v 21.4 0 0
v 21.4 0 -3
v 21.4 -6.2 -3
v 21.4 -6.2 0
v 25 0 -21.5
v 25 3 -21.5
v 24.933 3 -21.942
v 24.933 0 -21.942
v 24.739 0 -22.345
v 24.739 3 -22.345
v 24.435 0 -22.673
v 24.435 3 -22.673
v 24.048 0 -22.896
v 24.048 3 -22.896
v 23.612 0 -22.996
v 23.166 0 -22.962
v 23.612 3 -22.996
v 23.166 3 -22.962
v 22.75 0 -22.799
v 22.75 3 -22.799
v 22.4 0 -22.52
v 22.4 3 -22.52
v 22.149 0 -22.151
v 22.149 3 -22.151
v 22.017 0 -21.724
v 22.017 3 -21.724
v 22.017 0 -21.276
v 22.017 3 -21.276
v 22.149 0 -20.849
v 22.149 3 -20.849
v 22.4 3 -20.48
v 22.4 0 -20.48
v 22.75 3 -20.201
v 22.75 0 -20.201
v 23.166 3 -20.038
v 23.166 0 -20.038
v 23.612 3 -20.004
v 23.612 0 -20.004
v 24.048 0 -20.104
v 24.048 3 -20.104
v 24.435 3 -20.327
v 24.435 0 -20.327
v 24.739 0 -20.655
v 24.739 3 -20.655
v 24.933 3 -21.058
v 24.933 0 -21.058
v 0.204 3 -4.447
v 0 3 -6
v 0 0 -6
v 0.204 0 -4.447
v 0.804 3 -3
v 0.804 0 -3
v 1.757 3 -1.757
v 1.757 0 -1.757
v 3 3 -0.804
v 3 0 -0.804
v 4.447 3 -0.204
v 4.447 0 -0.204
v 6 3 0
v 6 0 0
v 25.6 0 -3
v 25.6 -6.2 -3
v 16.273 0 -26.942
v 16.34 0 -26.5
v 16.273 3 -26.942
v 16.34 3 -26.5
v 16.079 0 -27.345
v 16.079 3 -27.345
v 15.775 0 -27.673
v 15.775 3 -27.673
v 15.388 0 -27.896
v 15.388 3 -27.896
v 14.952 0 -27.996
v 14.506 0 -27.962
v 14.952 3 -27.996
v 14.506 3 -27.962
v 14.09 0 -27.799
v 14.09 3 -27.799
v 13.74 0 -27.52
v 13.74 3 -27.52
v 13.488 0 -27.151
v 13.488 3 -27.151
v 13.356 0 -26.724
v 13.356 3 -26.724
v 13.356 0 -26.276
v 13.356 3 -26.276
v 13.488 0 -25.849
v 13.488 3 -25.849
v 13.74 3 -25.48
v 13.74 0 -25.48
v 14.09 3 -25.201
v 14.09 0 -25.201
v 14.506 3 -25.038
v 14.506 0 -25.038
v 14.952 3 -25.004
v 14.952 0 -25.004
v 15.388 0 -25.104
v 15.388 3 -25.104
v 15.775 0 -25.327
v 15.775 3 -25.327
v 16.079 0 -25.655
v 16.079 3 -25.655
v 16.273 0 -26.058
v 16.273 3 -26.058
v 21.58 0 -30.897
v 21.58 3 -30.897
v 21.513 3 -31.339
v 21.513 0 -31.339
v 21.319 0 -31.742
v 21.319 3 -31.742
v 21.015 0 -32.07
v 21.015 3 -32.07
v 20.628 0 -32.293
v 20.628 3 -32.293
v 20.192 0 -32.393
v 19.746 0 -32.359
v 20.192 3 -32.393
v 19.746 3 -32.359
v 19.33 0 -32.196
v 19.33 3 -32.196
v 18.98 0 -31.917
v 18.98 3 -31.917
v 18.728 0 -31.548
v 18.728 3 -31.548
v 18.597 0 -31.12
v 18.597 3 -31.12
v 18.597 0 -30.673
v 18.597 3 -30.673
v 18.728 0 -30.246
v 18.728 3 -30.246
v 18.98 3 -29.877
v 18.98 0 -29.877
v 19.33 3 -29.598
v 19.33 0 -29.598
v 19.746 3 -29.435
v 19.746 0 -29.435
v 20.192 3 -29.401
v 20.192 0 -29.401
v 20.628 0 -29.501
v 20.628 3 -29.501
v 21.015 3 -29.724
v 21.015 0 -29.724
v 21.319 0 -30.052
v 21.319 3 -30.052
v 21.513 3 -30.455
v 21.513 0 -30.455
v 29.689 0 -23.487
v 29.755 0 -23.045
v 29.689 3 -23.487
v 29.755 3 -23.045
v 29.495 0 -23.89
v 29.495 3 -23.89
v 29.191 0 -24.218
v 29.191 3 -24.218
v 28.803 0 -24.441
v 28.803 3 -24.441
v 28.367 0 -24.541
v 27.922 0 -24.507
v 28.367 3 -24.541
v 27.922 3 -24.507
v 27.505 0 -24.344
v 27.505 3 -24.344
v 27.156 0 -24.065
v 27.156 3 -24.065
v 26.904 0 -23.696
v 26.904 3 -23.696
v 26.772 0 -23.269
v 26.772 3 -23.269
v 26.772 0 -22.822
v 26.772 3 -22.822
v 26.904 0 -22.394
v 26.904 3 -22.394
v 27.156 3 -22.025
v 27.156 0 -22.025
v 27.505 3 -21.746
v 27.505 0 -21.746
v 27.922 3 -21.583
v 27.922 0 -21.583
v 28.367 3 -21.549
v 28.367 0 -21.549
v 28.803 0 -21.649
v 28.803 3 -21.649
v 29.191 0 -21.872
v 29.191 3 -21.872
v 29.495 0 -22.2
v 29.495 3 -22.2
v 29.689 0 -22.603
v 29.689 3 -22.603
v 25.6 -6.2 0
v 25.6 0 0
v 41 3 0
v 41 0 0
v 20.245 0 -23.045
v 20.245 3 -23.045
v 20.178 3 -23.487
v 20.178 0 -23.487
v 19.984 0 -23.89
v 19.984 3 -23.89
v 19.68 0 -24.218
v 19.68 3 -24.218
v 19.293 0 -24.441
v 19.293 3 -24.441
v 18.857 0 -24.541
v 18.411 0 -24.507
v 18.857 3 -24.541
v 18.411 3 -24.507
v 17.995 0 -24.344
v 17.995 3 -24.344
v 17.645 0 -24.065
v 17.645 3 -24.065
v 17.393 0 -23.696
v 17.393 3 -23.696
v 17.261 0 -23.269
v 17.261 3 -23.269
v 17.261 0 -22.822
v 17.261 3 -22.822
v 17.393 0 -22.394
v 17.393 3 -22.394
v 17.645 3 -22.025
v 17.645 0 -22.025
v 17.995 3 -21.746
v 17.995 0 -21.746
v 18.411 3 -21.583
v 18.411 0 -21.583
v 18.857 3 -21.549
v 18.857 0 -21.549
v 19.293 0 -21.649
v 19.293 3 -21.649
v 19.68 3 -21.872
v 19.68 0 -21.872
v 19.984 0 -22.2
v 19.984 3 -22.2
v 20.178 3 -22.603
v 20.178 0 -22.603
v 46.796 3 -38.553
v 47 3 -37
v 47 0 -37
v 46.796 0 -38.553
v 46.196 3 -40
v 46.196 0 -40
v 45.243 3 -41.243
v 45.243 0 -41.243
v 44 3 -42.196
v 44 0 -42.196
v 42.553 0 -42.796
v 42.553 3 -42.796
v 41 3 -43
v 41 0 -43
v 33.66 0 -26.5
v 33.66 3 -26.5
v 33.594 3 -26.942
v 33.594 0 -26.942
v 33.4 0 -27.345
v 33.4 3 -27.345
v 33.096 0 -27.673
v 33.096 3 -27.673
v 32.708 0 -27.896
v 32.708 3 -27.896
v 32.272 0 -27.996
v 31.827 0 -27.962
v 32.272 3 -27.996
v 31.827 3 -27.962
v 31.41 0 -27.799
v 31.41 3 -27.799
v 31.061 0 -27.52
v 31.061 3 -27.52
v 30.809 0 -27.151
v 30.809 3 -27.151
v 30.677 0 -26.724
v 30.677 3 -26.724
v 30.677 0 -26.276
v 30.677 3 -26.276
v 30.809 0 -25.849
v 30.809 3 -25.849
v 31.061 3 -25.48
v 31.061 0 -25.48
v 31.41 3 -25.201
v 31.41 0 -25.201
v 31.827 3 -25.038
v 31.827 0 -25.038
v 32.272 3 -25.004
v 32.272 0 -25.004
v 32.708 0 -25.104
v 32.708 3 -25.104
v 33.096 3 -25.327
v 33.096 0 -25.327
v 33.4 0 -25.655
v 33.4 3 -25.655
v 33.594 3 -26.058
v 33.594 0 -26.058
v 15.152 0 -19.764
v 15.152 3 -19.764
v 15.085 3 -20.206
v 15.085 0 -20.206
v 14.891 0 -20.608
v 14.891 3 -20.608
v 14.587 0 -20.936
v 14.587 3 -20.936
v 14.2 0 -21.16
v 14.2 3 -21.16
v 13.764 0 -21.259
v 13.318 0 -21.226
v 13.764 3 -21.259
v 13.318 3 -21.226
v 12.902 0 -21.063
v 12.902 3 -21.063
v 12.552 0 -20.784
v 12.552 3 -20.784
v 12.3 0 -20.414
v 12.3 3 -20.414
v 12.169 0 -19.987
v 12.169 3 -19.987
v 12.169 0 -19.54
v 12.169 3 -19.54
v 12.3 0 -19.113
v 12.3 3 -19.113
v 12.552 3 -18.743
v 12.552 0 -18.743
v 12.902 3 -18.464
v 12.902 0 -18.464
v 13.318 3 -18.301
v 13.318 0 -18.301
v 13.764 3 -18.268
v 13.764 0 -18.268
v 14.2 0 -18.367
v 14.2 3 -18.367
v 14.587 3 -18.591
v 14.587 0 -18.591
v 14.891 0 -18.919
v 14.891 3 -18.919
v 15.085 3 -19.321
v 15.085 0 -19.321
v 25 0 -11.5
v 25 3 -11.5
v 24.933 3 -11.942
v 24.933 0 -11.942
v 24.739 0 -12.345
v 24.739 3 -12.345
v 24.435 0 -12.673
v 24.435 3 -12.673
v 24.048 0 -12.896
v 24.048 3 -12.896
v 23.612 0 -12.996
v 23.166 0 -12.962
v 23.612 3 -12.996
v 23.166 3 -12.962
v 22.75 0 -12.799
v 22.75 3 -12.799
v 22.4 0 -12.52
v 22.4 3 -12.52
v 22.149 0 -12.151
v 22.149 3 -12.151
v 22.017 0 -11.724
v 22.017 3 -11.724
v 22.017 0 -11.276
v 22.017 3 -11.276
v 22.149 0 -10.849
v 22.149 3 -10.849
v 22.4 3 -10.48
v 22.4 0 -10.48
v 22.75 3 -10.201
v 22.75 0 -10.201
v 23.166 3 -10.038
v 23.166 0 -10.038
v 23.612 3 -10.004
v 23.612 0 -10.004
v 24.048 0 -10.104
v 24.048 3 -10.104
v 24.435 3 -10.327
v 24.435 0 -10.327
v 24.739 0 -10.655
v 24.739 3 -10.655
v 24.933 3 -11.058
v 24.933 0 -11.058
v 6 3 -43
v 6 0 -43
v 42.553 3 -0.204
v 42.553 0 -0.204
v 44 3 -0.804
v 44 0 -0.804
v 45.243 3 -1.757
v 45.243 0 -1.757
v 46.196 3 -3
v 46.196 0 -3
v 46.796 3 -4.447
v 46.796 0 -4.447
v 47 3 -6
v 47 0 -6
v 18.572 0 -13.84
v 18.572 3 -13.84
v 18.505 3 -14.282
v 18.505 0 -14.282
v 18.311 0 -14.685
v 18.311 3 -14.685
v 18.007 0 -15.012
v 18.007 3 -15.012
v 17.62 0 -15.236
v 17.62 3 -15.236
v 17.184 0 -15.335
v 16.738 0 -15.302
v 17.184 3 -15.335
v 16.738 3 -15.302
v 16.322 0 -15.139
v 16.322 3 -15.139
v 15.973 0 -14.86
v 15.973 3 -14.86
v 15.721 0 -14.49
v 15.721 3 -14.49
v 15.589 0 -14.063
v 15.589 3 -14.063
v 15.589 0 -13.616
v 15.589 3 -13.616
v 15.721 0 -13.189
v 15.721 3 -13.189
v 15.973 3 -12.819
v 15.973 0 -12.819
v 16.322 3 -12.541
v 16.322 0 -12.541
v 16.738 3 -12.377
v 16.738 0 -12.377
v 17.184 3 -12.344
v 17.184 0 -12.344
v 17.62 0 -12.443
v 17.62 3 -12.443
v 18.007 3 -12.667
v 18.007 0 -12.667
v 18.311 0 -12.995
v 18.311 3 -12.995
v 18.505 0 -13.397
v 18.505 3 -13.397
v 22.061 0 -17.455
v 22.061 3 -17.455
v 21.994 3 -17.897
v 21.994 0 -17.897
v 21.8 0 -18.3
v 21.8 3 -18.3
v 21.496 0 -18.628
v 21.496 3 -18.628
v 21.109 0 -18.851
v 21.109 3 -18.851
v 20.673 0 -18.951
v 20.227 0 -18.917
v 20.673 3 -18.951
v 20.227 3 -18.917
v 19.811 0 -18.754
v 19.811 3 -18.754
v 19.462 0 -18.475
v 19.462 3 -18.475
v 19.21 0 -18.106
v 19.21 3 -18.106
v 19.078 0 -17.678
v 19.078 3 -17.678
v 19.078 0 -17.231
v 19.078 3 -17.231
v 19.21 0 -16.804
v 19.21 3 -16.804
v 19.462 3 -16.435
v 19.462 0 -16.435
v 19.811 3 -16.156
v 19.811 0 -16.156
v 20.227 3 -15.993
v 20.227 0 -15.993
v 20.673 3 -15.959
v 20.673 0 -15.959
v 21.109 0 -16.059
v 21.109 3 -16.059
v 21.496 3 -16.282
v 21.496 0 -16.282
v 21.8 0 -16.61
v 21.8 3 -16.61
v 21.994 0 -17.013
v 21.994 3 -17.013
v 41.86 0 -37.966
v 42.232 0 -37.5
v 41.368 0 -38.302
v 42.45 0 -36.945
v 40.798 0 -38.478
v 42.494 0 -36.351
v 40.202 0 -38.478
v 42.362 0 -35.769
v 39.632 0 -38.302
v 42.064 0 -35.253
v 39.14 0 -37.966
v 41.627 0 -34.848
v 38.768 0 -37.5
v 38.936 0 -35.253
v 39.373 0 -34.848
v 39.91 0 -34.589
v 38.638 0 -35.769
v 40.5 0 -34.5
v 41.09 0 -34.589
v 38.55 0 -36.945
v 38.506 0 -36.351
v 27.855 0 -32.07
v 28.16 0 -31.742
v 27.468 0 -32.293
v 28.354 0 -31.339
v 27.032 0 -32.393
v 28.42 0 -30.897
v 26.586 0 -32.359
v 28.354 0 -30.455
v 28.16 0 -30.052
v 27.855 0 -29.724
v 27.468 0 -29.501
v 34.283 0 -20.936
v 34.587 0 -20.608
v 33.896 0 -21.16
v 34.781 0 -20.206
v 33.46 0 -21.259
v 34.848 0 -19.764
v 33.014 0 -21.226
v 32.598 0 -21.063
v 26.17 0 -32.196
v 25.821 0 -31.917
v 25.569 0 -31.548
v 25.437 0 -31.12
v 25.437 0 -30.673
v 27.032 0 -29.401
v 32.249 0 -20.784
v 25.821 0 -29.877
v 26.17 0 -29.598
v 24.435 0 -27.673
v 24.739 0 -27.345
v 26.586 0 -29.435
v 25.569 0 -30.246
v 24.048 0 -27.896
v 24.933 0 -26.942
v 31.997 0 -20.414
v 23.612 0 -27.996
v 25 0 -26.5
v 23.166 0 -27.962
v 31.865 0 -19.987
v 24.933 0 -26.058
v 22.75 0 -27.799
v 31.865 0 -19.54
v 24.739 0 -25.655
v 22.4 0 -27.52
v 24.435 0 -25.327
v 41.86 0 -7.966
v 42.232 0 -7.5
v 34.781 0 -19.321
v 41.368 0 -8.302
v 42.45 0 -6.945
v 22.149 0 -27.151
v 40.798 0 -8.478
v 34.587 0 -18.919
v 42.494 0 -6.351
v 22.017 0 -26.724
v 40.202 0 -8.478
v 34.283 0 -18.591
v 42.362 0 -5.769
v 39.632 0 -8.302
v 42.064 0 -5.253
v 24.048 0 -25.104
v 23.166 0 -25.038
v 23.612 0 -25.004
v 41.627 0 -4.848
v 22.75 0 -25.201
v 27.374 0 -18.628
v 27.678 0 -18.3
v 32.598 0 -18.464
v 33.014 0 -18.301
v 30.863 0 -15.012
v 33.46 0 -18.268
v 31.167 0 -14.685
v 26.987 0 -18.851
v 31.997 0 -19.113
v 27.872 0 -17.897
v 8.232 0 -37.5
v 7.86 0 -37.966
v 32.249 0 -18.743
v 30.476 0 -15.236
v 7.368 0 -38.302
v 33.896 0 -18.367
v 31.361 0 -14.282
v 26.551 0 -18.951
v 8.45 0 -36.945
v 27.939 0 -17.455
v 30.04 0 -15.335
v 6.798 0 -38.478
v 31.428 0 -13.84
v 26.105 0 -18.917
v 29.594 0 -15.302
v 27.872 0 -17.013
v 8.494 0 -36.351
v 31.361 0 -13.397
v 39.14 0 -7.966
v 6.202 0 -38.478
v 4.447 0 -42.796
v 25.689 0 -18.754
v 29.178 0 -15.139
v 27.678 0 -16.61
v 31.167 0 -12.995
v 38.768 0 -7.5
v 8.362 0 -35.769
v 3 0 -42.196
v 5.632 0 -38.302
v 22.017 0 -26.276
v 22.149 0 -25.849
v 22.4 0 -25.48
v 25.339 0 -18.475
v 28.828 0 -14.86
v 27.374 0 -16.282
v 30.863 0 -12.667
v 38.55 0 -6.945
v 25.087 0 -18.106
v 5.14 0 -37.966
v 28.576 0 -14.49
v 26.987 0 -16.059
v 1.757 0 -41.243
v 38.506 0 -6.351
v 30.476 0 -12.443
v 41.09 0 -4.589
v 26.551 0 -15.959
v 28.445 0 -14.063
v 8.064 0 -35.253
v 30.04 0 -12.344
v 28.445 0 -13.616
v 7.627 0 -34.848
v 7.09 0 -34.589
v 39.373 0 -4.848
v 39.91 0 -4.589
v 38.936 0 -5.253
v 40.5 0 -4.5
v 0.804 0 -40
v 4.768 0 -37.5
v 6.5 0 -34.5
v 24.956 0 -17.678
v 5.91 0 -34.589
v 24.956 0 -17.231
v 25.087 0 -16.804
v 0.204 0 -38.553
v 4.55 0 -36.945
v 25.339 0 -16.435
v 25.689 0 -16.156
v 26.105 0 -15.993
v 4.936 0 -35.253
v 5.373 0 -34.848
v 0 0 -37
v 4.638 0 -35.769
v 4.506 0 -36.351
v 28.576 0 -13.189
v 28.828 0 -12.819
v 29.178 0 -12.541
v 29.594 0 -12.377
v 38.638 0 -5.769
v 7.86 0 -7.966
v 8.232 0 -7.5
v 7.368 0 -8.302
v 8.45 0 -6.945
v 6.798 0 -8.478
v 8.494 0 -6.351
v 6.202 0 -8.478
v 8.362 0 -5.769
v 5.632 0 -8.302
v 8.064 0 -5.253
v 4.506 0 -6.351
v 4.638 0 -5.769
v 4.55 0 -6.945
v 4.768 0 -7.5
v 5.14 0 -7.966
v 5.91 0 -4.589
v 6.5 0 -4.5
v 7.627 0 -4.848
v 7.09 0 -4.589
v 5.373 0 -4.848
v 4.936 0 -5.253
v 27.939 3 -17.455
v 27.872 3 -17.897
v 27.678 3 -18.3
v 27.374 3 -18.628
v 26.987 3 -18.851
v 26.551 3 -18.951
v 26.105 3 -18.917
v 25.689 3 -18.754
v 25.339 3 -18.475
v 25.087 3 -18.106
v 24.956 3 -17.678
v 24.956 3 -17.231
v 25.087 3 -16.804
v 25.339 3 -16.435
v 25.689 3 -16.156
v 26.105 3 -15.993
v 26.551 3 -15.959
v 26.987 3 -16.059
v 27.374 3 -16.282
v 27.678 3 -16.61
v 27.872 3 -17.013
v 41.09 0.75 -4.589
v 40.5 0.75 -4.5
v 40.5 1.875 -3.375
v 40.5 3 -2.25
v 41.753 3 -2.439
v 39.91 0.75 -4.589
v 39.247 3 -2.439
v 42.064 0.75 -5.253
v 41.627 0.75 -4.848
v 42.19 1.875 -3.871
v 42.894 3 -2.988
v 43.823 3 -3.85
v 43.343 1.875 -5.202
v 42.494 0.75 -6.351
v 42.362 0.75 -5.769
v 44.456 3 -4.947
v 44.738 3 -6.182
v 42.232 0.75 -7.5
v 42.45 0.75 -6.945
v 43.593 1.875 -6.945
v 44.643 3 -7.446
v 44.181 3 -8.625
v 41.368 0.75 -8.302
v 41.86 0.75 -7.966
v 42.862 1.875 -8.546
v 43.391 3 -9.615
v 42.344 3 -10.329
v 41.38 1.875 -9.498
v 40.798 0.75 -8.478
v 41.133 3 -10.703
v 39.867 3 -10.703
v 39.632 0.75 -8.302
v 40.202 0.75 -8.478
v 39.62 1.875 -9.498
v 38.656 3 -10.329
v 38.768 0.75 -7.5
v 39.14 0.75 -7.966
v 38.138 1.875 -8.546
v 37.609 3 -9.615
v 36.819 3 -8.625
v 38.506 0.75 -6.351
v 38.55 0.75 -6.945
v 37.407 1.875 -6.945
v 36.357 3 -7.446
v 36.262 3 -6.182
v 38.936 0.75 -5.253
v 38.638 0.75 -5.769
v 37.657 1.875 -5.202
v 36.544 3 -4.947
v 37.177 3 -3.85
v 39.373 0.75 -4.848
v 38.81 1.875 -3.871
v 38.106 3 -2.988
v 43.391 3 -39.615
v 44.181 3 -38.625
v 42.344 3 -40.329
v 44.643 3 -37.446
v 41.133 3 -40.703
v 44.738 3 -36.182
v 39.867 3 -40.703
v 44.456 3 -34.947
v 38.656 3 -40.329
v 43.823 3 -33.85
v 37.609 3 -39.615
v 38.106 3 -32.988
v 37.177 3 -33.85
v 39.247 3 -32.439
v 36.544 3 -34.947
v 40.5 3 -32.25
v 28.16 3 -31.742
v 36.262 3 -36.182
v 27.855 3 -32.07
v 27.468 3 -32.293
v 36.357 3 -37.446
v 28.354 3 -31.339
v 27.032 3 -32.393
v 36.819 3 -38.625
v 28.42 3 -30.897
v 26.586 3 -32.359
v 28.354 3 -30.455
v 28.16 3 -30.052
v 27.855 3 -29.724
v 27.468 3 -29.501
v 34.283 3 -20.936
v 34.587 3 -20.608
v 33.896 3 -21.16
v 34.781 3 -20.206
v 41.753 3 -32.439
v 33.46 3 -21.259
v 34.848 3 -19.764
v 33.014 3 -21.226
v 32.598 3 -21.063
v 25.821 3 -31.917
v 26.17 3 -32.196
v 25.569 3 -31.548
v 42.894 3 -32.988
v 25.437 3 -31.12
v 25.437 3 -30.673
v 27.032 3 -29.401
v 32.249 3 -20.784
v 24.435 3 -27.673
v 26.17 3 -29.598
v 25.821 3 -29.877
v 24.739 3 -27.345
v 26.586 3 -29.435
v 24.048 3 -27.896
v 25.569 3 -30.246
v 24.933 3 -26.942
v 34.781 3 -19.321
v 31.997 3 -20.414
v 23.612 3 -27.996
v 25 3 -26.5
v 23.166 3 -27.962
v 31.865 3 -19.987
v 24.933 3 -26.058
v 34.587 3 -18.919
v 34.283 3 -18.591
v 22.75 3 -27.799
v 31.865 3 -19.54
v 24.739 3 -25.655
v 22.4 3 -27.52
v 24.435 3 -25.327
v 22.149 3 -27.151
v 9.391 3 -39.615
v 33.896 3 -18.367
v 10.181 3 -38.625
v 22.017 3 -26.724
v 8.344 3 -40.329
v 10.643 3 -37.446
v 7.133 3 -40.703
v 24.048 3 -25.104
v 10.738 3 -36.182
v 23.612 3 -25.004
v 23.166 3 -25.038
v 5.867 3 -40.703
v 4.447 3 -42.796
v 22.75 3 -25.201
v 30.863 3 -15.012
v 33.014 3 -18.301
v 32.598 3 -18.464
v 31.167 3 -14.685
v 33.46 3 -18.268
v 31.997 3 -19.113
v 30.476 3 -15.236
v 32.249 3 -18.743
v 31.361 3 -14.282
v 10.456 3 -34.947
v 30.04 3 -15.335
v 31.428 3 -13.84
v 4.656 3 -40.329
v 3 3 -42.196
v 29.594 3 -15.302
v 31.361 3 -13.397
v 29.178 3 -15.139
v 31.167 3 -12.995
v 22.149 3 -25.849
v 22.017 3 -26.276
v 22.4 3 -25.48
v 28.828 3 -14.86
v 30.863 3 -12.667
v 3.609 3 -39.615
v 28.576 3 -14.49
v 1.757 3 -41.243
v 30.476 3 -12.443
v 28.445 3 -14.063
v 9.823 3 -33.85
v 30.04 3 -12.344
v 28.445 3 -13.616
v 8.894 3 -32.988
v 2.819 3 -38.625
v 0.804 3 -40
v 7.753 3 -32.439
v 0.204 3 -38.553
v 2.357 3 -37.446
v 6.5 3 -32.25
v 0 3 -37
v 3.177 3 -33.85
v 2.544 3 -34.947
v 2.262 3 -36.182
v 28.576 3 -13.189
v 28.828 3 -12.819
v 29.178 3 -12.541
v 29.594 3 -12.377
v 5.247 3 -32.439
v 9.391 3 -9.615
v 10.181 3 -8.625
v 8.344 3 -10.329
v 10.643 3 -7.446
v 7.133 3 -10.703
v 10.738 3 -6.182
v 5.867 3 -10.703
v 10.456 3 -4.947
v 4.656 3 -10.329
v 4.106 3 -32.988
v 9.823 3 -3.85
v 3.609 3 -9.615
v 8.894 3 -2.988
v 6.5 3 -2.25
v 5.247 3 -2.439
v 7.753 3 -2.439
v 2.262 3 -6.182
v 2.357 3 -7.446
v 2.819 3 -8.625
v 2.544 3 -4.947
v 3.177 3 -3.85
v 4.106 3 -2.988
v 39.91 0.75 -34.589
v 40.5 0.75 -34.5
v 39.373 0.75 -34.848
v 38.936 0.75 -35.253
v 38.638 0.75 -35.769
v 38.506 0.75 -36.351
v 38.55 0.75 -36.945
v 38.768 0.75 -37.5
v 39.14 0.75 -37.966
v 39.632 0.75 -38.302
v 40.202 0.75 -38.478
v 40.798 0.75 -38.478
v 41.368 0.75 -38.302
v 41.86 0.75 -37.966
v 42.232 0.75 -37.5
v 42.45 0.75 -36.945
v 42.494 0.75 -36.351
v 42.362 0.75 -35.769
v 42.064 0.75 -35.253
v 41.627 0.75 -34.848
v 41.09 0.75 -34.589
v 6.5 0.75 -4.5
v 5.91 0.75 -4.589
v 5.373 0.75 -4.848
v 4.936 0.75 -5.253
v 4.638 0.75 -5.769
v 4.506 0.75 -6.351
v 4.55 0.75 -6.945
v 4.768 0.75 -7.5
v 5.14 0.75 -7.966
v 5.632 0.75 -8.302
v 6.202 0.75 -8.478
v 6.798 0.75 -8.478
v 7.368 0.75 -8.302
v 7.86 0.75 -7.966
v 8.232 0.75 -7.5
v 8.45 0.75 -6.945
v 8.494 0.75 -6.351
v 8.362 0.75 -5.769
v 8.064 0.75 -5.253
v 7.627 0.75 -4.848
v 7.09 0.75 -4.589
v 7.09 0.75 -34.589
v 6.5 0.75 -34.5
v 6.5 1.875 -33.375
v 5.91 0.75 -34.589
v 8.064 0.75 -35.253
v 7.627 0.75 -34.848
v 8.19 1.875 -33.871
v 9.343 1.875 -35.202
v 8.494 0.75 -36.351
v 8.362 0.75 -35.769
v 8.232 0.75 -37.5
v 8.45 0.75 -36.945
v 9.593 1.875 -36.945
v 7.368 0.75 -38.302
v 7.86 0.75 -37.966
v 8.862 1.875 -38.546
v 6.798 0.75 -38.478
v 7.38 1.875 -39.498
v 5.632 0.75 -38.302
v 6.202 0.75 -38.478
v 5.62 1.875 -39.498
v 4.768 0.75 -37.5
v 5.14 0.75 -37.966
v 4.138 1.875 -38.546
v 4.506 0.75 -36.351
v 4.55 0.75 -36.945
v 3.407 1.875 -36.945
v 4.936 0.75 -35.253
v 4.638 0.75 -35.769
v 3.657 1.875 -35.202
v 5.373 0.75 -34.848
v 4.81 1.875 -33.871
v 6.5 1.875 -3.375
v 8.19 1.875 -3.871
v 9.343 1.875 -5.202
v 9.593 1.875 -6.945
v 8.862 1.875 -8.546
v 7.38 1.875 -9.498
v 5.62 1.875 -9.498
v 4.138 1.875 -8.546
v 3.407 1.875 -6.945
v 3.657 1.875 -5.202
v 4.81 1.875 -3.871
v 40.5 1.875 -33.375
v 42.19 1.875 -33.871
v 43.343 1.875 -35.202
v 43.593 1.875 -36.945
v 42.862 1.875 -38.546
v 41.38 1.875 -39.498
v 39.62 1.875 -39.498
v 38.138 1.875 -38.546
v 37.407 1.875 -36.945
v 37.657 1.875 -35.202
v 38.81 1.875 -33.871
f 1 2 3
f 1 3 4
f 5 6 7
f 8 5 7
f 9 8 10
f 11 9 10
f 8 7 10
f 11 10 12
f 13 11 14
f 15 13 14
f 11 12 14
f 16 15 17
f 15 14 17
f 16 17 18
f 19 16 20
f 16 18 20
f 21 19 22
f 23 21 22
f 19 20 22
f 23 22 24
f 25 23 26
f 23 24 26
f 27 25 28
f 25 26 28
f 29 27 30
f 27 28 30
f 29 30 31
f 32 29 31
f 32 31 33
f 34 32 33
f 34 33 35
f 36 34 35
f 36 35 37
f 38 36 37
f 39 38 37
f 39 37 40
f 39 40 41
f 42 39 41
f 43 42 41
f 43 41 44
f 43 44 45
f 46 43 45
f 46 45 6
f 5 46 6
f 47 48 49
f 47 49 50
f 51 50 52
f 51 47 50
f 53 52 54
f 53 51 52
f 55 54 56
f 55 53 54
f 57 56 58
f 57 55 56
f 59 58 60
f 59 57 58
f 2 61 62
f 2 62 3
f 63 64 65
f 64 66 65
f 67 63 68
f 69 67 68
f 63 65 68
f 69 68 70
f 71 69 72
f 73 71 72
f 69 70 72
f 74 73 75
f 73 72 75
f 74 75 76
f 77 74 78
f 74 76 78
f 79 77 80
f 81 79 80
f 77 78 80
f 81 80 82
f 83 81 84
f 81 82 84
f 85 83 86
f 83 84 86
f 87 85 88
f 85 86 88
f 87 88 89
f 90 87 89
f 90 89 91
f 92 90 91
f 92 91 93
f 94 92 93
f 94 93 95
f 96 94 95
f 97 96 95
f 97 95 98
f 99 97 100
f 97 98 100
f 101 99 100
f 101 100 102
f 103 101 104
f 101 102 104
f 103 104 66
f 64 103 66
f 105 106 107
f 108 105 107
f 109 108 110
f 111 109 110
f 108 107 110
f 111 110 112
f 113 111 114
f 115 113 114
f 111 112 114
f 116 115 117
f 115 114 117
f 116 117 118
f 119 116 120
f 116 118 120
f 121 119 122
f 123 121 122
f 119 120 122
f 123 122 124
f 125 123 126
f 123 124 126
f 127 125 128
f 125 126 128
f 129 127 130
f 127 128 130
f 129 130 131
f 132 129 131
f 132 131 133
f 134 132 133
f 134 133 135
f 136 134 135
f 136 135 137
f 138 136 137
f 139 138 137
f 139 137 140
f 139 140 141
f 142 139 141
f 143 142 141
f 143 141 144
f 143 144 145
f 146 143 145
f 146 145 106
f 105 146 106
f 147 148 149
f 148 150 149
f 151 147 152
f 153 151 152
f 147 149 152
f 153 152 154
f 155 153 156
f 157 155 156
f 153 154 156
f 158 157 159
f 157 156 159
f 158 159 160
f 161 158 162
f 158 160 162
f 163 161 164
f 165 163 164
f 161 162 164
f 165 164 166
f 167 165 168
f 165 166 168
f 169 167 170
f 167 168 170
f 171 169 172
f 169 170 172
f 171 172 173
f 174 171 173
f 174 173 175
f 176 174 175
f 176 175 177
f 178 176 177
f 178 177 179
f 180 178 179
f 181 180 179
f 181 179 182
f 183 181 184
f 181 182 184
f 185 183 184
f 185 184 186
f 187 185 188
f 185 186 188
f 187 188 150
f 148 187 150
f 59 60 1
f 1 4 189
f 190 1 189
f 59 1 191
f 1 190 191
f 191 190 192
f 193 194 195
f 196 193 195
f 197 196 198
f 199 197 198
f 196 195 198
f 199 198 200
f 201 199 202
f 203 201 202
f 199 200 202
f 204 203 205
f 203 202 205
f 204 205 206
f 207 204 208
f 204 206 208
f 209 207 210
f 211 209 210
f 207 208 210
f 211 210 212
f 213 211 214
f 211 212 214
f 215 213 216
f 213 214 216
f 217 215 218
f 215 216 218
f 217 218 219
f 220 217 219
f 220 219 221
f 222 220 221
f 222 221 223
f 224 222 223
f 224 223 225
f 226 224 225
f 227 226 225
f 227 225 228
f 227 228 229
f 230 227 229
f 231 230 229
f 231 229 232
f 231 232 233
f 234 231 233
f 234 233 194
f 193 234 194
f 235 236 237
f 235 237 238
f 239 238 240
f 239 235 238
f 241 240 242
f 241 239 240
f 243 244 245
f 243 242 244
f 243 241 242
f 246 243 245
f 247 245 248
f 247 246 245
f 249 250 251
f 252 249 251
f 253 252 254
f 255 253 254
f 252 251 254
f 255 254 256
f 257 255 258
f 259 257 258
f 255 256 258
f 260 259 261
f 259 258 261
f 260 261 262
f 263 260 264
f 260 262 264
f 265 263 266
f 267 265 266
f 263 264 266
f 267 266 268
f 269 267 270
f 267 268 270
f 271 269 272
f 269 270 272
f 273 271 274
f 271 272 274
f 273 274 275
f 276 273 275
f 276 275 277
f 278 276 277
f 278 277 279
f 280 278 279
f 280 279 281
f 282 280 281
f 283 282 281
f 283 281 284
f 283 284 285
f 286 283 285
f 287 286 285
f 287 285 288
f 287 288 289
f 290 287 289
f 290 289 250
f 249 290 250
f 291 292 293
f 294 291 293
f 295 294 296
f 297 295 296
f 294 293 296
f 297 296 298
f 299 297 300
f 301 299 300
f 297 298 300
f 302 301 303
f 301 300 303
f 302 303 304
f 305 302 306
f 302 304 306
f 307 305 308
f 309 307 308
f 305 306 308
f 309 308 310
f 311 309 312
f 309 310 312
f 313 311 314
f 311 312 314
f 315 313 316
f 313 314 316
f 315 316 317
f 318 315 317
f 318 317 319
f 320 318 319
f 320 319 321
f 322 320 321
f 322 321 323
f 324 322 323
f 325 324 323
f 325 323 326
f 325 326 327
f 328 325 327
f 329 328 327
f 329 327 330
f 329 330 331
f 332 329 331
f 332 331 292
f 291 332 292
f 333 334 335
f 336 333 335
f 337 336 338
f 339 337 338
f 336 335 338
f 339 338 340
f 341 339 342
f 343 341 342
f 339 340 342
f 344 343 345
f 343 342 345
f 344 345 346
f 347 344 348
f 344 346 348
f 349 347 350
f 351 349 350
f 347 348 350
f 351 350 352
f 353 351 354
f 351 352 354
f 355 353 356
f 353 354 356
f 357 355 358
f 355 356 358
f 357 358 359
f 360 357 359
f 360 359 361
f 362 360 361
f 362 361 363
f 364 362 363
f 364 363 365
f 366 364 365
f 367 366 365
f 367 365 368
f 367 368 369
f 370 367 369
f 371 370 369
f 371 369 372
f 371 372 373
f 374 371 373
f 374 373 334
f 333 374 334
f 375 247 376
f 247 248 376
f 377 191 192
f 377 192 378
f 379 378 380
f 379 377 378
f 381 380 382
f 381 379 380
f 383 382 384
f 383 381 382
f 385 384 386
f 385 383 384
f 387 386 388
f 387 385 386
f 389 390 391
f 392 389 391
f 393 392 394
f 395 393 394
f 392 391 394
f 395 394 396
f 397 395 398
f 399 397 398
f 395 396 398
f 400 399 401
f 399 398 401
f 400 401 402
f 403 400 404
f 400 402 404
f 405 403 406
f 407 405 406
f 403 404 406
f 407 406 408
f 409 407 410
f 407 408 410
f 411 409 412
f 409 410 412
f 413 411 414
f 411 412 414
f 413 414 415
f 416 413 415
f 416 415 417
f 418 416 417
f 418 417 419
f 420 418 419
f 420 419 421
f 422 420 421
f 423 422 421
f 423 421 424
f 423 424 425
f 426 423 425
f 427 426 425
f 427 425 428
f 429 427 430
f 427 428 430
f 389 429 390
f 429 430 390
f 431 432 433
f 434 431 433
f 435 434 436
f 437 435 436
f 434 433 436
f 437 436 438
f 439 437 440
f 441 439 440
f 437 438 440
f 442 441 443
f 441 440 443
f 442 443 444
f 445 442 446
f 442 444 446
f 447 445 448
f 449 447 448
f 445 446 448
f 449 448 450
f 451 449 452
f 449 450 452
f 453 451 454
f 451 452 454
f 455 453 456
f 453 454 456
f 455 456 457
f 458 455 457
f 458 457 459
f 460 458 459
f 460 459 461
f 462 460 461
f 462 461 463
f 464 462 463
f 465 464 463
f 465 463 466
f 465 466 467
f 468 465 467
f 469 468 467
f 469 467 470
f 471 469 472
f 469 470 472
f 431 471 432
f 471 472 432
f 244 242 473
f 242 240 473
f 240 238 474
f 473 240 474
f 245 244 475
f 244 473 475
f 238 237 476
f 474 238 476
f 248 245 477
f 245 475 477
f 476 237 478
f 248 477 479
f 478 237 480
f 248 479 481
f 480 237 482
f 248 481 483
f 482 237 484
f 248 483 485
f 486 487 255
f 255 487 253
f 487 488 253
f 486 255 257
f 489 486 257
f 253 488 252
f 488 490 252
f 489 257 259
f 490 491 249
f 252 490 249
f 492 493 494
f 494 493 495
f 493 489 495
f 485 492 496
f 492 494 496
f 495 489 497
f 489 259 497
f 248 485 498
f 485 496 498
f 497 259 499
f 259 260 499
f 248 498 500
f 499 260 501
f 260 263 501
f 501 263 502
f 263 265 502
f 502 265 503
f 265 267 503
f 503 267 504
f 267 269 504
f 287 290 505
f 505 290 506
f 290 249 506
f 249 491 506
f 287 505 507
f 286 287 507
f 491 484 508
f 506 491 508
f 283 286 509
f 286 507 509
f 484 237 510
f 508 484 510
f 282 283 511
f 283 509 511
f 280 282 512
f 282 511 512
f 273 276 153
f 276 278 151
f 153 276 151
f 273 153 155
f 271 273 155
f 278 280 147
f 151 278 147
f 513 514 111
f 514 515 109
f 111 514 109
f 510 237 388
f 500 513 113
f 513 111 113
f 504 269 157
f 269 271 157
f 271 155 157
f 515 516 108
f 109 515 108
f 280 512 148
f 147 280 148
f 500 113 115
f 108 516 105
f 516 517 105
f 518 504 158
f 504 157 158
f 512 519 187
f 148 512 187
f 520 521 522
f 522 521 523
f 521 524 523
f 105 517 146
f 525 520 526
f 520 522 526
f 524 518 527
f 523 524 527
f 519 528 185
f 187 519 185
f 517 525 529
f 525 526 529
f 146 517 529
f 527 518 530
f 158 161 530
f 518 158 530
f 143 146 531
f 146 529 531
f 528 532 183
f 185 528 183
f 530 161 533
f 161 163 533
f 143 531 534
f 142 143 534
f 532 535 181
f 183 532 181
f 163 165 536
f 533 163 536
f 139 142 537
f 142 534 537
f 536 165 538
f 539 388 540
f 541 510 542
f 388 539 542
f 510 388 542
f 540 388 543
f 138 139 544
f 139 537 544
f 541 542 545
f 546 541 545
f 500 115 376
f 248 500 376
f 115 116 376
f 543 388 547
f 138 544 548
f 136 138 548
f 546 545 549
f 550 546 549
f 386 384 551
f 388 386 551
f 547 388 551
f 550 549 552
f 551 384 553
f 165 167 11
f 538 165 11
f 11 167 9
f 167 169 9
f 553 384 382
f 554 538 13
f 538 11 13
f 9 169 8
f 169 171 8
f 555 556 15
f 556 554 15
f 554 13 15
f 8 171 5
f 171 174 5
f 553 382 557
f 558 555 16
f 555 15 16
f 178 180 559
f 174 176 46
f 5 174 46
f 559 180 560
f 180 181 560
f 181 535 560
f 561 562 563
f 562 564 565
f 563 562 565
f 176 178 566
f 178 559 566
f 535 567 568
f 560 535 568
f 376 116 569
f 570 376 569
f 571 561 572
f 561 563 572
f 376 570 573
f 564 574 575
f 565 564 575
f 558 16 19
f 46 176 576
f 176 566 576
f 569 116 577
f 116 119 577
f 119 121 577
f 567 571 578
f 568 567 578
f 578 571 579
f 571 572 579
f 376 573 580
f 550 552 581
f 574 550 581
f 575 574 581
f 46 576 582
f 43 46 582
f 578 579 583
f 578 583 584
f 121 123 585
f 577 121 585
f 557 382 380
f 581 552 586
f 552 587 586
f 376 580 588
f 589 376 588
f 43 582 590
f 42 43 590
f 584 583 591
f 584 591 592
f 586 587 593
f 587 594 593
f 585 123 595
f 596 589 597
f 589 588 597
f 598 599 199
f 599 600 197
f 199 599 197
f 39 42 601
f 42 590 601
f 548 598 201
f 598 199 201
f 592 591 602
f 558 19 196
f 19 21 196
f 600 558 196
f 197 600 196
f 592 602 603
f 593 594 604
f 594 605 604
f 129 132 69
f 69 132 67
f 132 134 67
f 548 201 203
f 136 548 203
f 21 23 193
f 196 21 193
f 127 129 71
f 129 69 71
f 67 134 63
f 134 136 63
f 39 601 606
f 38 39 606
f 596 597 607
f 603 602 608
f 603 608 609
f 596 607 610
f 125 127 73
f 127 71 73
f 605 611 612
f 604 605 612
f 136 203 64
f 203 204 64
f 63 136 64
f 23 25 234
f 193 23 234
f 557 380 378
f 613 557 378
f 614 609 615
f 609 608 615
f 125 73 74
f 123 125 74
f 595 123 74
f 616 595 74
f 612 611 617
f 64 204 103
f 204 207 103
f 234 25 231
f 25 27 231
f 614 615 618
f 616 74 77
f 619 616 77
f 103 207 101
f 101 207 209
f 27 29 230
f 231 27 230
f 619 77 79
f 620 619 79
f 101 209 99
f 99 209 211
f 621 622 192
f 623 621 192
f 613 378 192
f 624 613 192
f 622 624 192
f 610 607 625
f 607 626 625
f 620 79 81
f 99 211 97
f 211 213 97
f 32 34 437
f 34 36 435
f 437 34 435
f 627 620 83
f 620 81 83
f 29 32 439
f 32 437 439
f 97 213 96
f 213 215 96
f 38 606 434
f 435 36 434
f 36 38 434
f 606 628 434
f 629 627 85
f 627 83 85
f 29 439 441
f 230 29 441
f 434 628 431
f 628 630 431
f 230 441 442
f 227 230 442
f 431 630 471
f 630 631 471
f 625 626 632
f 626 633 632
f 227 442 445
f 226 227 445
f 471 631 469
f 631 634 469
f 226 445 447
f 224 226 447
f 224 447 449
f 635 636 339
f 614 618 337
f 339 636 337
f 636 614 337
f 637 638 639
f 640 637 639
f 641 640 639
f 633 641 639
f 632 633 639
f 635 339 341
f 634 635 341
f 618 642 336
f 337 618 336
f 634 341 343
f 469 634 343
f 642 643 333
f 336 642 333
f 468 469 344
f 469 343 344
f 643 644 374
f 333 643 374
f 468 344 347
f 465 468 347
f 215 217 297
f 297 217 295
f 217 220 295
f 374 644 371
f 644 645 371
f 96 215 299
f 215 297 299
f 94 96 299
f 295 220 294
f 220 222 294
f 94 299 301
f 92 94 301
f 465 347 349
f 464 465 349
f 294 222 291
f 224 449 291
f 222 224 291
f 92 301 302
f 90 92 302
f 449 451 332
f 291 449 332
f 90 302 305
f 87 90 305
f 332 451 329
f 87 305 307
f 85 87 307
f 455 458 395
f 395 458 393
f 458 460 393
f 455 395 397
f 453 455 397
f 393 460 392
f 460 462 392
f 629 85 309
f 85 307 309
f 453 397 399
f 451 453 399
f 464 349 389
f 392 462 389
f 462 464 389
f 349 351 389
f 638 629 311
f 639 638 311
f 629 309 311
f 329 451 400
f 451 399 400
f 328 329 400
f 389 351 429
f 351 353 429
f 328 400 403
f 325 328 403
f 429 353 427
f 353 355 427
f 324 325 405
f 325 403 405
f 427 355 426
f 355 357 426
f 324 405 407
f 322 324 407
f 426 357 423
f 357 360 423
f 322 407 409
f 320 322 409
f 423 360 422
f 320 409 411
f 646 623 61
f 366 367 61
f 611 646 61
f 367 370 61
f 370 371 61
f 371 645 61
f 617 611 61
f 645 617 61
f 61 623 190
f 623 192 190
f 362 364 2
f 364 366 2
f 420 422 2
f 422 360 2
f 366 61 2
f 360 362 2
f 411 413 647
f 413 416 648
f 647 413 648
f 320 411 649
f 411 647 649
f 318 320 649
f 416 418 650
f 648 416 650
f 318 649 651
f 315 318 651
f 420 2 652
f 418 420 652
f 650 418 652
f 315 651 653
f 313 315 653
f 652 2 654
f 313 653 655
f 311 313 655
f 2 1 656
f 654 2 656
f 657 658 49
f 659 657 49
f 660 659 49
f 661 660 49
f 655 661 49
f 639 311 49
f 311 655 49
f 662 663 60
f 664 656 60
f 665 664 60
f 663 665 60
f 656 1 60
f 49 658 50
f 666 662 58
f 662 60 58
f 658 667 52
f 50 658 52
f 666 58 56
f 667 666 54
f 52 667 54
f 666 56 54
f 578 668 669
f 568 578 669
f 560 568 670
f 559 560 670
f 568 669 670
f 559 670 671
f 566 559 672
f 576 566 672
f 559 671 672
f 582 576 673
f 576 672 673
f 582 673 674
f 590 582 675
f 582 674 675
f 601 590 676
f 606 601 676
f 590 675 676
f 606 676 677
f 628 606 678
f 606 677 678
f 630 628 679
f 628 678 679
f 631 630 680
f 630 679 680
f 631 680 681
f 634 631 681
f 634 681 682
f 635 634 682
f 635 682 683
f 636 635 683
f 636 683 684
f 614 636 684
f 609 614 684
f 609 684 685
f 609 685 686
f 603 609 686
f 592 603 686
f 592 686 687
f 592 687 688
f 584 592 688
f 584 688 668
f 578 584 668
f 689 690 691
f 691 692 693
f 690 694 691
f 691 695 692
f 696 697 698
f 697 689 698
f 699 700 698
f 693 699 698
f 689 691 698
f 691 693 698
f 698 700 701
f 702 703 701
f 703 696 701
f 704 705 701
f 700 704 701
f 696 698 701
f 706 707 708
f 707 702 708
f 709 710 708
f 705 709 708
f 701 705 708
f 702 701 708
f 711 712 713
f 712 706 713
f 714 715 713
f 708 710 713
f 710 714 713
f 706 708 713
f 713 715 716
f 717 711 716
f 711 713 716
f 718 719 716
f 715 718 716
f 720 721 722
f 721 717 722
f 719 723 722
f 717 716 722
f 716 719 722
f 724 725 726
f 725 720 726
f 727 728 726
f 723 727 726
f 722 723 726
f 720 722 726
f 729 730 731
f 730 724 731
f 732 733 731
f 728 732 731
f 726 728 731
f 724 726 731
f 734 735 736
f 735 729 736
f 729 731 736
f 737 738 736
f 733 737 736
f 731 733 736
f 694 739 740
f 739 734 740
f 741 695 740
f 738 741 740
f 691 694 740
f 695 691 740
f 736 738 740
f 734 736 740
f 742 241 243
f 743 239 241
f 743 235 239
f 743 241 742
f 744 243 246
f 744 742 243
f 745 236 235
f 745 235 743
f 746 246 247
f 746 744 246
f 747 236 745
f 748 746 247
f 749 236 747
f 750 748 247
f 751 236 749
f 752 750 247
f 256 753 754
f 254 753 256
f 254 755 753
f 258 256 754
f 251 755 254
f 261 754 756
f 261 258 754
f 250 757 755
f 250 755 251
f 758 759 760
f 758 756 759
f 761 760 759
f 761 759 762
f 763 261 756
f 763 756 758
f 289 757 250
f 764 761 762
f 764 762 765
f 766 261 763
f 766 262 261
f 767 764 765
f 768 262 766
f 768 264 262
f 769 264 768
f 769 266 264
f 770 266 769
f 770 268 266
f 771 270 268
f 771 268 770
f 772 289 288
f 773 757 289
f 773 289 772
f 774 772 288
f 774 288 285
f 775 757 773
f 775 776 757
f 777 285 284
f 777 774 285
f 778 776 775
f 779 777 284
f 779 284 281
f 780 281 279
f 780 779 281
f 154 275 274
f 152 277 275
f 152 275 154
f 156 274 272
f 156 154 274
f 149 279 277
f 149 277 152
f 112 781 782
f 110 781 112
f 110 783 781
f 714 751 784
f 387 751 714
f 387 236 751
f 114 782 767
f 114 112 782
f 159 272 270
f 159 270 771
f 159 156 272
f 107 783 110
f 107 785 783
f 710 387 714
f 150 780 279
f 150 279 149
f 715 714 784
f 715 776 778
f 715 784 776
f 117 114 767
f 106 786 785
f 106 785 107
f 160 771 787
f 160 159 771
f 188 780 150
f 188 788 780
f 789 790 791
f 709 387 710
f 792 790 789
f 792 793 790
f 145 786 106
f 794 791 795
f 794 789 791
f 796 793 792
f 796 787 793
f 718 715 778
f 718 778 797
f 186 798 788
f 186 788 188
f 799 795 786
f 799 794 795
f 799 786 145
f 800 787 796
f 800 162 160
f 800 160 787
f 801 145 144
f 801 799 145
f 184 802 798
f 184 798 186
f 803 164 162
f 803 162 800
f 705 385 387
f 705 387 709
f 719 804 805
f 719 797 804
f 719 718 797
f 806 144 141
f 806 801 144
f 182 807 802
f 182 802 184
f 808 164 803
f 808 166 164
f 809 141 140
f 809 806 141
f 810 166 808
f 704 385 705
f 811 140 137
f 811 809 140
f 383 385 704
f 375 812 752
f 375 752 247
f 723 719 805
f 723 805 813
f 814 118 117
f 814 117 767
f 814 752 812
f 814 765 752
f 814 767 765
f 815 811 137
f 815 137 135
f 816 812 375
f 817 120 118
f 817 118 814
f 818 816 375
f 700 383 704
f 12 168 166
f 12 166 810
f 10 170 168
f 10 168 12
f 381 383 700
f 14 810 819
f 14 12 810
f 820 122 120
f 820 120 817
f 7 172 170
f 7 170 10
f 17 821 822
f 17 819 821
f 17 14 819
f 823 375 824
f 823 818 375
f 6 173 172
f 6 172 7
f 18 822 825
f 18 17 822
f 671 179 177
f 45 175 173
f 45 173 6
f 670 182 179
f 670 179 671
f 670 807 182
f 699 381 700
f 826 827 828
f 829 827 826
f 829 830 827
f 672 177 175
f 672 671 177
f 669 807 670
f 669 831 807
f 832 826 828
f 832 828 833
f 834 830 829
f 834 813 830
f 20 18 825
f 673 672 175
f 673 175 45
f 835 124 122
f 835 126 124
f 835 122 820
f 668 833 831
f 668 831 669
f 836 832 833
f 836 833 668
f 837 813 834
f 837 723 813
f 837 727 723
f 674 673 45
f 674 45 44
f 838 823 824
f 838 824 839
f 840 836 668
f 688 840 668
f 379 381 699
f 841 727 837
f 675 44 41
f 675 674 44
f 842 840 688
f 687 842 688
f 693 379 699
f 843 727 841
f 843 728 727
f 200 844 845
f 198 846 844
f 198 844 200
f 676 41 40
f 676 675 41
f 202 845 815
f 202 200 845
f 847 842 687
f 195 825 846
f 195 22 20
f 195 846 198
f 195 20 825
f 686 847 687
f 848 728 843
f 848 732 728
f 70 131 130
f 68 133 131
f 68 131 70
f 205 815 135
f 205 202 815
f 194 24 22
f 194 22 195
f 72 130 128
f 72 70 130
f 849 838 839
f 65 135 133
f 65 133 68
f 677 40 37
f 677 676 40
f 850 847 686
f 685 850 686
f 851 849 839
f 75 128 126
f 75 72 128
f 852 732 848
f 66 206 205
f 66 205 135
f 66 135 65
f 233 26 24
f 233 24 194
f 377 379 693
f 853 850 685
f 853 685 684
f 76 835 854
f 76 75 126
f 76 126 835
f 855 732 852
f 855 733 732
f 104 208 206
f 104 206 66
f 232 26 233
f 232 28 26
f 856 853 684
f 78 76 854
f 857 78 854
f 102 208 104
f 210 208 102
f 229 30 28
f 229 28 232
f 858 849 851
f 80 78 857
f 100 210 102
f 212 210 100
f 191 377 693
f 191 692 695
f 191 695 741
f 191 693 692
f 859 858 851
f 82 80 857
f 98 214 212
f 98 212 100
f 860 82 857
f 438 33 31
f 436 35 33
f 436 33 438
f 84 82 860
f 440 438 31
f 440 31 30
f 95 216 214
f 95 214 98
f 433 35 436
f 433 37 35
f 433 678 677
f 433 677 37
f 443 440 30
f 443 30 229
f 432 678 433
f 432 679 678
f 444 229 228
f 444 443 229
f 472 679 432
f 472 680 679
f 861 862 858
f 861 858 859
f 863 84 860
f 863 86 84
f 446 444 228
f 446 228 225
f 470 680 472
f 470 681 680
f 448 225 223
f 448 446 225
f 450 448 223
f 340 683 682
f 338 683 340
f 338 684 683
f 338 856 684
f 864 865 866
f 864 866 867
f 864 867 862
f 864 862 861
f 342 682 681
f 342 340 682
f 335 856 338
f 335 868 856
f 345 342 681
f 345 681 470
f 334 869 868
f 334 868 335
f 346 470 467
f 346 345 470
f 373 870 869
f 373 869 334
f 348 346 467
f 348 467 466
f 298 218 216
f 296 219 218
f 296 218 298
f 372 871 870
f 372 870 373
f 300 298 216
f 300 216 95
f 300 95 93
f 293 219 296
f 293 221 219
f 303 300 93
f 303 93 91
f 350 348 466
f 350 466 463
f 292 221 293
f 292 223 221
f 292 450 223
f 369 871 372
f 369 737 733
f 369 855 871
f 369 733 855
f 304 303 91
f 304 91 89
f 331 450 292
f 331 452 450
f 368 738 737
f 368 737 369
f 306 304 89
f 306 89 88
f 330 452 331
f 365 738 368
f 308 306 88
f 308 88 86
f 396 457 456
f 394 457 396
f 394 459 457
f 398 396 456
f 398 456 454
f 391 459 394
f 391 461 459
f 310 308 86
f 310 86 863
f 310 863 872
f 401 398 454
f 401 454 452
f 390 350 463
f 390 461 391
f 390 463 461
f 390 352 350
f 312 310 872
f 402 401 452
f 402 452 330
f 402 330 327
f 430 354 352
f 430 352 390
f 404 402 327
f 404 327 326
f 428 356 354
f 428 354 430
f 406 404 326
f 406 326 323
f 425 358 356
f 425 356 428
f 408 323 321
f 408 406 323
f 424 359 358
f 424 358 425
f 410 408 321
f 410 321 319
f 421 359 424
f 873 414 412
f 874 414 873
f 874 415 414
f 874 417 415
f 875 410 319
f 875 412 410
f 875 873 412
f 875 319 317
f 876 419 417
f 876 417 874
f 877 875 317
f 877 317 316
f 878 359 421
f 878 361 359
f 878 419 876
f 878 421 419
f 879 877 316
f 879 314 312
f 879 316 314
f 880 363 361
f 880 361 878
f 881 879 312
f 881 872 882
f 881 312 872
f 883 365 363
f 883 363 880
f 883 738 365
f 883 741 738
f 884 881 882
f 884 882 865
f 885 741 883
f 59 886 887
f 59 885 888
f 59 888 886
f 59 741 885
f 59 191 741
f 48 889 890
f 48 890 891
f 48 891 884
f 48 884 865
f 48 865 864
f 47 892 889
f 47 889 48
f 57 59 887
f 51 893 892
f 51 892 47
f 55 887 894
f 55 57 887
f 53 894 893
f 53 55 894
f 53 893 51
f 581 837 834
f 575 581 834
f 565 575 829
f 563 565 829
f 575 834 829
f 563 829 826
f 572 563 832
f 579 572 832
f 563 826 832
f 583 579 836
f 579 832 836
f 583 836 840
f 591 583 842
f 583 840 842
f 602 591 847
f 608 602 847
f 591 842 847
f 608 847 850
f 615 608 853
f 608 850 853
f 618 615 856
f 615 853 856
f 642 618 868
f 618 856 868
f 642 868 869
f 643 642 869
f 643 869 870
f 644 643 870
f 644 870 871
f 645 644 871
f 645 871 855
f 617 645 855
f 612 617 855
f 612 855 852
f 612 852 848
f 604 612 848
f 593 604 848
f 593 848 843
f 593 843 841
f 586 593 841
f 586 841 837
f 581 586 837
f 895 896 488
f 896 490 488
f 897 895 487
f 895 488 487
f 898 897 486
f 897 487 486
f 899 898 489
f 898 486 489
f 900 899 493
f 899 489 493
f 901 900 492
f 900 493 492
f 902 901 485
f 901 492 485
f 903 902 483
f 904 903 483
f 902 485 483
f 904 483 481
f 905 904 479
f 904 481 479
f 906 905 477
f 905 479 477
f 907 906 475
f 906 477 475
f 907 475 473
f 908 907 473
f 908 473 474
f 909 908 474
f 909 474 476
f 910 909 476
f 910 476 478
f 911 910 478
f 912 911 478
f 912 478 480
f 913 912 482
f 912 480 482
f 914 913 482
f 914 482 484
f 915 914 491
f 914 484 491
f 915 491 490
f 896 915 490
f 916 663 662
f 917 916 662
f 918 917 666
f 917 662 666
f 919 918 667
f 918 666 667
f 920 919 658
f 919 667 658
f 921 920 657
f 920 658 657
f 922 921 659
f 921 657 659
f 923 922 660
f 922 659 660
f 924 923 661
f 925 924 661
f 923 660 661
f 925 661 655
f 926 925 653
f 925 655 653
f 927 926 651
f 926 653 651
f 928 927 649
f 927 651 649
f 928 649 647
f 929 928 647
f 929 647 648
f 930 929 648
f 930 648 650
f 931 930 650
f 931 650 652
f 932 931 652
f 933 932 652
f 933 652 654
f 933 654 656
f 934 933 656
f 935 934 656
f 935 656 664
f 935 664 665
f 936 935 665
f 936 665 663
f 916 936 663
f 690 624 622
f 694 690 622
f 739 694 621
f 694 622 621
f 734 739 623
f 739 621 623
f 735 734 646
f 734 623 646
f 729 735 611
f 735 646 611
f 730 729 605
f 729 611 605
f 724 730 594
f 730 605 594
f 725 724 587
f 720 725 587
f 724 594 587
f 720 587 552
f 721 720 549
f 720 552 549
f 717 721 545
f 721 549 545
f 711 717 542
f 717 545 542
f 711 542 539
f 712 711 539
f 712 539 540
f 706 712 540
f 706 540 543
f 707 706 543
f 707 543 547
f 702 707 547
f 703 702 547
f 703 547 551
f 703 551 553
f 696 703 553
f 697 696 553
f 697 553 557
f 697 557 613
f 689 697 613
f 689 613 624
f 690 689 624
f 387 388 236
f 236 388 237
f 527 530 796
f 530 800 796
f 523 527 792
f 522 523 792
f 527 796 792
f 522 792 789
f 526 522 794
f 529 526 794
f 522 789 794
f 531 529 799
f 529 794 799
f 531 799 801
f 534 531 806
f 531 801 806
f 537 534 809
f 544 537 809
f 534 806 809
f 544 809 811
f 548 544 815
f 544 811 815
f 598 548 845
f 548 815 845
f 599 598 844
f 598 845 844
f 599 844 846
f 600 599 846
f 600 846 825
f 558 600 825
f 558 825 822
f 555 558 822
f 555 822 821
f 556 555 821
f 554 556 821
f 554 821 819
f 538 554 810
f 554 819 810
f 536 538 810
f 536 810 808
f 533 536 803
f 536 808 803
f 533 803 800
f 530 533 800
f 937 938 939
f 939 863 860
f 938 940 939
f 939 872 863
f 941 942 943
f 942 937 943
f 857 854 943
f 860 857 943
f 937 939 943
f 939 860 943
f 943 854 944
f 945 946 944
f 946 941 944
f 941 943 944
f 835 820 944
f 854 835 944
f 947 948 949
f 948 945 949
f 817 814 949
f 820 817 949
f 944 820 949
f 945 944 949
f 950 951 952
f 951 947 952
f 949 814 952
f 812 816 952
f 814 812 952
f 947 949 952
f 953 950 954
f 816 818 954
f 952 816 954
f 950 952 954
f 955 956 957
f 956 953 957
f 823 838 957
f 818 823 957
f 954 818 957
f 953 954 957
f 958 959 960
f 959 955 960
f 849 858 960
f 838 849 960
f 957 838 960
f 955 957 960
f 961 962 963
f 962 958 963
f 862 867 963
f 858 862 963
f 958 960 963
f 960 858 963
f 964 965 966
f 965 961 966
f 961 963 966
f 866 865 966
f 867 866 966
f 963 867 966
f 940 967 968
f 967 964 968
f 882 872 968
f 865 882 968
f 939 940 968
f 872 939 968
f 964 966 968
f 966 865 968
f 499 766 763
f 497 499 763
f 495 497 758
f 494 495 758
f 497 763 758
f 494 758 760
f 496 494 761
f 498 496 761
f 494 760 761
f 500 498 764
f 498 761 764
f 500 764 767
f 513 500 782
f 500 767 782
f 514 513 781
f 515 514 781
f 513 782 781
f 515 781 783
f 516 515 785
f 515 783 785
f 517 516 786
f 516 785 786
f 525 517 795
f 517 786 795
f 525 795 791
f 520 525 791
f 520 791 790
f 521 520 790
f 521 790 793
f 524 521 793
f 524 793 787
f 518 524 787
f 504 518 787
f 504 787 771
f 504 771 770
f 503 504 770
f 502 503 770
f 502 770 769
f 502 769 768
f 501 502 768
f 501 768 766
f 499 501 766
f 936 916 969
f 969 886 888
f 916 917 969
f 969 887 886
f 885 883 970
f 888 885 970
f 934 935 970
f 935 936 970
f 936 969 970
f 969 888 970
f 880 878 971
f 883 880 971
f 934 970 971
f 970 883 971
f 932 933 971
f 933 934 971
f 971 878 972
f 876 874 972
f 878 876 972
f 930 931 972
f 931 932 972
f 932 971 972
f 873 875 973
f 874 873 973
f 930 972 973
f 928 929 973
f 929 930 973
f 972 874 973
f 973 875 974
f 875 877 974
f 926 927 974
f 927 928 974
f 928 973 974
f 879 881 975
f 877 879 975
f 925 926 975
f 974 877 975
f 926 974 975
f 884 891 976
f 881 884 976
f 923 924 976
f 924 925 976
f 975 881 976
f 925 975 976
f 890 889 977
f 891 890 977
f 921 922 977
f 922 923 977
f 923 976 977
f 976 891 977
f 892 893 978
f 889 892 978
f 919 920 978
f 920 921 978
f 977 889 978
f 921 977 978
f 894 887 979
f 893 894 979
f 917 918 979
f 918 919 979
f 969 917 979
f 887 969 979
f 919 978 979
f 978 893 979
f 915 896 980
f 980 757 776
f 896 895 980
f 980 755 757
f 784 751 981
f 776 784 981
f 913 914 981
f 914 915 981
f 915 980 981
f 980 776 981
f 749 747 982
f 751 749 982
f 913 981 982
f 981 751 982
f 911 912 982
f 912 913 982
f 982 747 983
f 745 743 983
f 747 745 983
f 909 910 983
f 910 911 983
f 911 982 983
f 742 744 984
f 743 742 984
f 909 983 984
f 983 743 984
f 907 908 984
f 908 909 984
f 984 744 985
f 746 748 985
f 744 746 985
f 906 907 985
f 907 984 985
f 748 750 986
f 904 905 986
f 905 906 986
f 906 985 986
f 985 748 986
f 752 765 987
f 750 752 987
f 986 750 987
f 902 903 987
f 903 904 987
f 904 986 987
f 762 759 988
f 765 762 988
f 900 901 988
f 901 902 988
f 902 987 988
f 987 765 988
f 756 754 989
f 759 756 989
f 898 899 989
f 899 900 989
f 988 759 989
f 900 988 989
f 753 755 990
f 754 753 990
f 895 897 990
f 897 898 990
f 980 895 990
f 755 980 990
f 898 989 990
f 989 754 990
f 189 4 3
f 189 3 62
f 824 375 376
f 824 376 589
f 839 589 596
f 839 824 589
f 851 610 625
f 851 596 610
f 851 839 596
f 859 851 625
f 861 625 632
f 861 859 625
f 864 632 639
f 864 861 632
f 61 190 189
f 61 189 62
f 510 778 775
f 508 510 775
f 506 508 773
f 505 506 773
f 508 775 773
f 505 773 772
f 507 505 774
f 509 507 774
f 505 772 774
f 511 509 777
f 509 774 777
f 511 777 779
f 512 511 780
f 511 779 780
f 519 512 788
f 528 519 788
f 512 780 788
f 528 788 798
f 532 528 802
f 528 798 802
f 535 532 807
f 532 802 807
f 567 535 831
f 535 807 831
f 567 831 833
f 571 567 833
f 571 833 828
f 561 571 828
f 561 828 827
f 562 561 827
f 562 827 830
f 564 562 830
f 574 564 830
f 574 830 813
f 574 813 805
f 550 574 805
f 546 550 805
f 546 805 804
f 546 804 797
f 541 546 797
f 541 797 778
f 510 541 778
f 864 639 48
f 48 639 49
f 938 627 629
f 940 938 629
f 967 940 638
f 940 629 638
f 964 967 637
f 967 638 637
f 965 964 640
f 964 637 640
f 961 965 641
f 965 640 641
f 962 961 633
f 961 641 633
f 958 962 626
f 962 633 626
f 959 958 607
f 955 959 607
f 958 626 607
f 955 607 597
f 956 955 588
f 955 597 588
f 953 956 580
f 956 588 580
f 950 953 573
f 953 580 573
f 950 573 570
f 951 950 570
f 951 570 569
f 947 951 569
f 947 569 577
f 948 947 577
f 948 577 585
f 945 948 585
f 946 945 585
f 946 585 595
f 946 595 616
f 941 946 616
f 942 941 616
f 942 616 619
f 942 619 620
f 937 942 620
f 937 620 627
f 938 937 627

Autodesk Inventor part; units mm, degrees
ref_plane "YZ Plane" through (0, 0, 0) normal (1, 0, 0) x (0, 1, 0)
ref_plane "XZ Plane" through (0, 0, 0) normal (0, 1, 0) x (-1, 0, 0)
ref_plane "XY Plane" through (0, 0, 0) normal (0, 0, 1) x (1, 0, 0)
sketch "Sketch1" plane through (0, 0, 0) normal (0, 1, 0) x (-1, 0, 0)
  line L0 (0, 0) -> (-47, 0)
  line L1 (-47, 0) -> (-47, -43)
  line L2 (-47, -43) -> (0, -43)
  line L3 (0, -43) -> (0, 0)
  dimension "d0" = 43
  dimension "d1" = 47
extrude "Extrusion1" add sketch "Sketch1" along normal blind 3
sketch "Sketch2" plane through (0, 3, 0) normal (0, 1, 0) x (1, 0, 0)
  line L0 (47, 43) -> (0, 43) projected
  line L1 (0, 43) -> (0, 0) projected
  line L2 (6.5, 36.5) -> (40.5, 36.5) construction
  line L3 (40.5, 36.5) -> (40.5, 6.5) construction
  line L4 (40.5, 6.5) -> (6.5, 6.5) construction
  line L5 (6.5, 6.5) -> (6.5, 36.5) construction
  point P0 (23.5, 36.5)
  point P1 (23.5, 43)
  point P2 (6.5, 21.5)
  point P3 (0, 21.5)
  dimension "d4" = 6.5
  dimension "d5" = 6.5
hole "Hole1" at (6.5, 3, -6.5) at (6.5, 3, -36.5) at (40.5, 3, -36.5) at (40.5, 3, -6.5) direction (0, -1, 0) diameter 4 end through all countersink diameter 8.5 countersink angle 90
sketch "Sketch3" plane through (0, 0, 0) normal (0, -1, 0) x (1, 0, 0)
  line L0 (0, 0) -> (47, 0) projected
  line L1 (21.4, 0) -> (25.6, 0)
  line L2 (25.6, 0) -> (25.6, -3)
  line L3 (25.6, -3) -> (21.4, -3)
  line L4 (21.4, -3) -> (21.4, 0)
  point P0 (23.5, -3)
  point P1 (23.5, 0)
  dimension "d13" = 4.2
  dimension "d14" = 3
extrude "Extrusion2" add sketch "Sketch3" along normal blind 6.2
sketch "Sketch4" plane through (0, 3, 0) normal (0, 1, 0) x (1, 0, 0)
  line L0 (47, 43) -> (0, 43) projected
  line L1 (0, 43) -> (0, 0) projected
  circle A0 centre (23.5, 21.5) radius 1.5
  circle A1 centre (23.5, 26.5) radius 1.5
  circle A2 centre (18.7447, 23.0451) radius 1.5
  circle A3 centre (20.5611, 17.4549) radius 1.5
  circle A4 centre (26.4389, 17.4549) radius 1.5
  circle A5 centre (28.2553, 23.0451) radius 1.5
  circle A6 centre (23.5, 11.5) radius 1.5
  circle A7 centre (29.9279, 13.8396) radius 1.5
  circle A8 centre (33.3481, 19.7635) radius 1.5
  circle A9 centre (32.1603, 26.5) radius 1.5
  circle A10 centre (26.9202, 30.8969) radius 1.5
  circle A11 centre (20.0798, 30.8969) radius 1.5
  circle A12 centre (14.8397, 26.5) radius 1.5
  circle A13 centre (13.6519, 19.7635) radius 1.5
  circle A14 centre (17.0721, 13.8396) radius 1.5
  point P0 (23.5, 43)
  point P1 (0, 21.5)
  dimension "d17" = 3
  dimension "d18" = 3
  dimension "d19" = 5
  dimension "d22" = 360
  dimension "d24" = 3
  dimension "d25" = 10
  dimension "d28" = 360
extrude "Extrusion3" cut sketch "Sketch4" against normal through all
fillet "Fillet1" radius 6 4 edges at (0, 1.5, -43) (0, 1.5, 0) (47, 1.5, 0) (47, 1.5, -43)
equation "\"d5\" = d4"
equation "\"d18\" = d17"
equation "\"d24\" = d17"
properties part number "dht22_case_top"
